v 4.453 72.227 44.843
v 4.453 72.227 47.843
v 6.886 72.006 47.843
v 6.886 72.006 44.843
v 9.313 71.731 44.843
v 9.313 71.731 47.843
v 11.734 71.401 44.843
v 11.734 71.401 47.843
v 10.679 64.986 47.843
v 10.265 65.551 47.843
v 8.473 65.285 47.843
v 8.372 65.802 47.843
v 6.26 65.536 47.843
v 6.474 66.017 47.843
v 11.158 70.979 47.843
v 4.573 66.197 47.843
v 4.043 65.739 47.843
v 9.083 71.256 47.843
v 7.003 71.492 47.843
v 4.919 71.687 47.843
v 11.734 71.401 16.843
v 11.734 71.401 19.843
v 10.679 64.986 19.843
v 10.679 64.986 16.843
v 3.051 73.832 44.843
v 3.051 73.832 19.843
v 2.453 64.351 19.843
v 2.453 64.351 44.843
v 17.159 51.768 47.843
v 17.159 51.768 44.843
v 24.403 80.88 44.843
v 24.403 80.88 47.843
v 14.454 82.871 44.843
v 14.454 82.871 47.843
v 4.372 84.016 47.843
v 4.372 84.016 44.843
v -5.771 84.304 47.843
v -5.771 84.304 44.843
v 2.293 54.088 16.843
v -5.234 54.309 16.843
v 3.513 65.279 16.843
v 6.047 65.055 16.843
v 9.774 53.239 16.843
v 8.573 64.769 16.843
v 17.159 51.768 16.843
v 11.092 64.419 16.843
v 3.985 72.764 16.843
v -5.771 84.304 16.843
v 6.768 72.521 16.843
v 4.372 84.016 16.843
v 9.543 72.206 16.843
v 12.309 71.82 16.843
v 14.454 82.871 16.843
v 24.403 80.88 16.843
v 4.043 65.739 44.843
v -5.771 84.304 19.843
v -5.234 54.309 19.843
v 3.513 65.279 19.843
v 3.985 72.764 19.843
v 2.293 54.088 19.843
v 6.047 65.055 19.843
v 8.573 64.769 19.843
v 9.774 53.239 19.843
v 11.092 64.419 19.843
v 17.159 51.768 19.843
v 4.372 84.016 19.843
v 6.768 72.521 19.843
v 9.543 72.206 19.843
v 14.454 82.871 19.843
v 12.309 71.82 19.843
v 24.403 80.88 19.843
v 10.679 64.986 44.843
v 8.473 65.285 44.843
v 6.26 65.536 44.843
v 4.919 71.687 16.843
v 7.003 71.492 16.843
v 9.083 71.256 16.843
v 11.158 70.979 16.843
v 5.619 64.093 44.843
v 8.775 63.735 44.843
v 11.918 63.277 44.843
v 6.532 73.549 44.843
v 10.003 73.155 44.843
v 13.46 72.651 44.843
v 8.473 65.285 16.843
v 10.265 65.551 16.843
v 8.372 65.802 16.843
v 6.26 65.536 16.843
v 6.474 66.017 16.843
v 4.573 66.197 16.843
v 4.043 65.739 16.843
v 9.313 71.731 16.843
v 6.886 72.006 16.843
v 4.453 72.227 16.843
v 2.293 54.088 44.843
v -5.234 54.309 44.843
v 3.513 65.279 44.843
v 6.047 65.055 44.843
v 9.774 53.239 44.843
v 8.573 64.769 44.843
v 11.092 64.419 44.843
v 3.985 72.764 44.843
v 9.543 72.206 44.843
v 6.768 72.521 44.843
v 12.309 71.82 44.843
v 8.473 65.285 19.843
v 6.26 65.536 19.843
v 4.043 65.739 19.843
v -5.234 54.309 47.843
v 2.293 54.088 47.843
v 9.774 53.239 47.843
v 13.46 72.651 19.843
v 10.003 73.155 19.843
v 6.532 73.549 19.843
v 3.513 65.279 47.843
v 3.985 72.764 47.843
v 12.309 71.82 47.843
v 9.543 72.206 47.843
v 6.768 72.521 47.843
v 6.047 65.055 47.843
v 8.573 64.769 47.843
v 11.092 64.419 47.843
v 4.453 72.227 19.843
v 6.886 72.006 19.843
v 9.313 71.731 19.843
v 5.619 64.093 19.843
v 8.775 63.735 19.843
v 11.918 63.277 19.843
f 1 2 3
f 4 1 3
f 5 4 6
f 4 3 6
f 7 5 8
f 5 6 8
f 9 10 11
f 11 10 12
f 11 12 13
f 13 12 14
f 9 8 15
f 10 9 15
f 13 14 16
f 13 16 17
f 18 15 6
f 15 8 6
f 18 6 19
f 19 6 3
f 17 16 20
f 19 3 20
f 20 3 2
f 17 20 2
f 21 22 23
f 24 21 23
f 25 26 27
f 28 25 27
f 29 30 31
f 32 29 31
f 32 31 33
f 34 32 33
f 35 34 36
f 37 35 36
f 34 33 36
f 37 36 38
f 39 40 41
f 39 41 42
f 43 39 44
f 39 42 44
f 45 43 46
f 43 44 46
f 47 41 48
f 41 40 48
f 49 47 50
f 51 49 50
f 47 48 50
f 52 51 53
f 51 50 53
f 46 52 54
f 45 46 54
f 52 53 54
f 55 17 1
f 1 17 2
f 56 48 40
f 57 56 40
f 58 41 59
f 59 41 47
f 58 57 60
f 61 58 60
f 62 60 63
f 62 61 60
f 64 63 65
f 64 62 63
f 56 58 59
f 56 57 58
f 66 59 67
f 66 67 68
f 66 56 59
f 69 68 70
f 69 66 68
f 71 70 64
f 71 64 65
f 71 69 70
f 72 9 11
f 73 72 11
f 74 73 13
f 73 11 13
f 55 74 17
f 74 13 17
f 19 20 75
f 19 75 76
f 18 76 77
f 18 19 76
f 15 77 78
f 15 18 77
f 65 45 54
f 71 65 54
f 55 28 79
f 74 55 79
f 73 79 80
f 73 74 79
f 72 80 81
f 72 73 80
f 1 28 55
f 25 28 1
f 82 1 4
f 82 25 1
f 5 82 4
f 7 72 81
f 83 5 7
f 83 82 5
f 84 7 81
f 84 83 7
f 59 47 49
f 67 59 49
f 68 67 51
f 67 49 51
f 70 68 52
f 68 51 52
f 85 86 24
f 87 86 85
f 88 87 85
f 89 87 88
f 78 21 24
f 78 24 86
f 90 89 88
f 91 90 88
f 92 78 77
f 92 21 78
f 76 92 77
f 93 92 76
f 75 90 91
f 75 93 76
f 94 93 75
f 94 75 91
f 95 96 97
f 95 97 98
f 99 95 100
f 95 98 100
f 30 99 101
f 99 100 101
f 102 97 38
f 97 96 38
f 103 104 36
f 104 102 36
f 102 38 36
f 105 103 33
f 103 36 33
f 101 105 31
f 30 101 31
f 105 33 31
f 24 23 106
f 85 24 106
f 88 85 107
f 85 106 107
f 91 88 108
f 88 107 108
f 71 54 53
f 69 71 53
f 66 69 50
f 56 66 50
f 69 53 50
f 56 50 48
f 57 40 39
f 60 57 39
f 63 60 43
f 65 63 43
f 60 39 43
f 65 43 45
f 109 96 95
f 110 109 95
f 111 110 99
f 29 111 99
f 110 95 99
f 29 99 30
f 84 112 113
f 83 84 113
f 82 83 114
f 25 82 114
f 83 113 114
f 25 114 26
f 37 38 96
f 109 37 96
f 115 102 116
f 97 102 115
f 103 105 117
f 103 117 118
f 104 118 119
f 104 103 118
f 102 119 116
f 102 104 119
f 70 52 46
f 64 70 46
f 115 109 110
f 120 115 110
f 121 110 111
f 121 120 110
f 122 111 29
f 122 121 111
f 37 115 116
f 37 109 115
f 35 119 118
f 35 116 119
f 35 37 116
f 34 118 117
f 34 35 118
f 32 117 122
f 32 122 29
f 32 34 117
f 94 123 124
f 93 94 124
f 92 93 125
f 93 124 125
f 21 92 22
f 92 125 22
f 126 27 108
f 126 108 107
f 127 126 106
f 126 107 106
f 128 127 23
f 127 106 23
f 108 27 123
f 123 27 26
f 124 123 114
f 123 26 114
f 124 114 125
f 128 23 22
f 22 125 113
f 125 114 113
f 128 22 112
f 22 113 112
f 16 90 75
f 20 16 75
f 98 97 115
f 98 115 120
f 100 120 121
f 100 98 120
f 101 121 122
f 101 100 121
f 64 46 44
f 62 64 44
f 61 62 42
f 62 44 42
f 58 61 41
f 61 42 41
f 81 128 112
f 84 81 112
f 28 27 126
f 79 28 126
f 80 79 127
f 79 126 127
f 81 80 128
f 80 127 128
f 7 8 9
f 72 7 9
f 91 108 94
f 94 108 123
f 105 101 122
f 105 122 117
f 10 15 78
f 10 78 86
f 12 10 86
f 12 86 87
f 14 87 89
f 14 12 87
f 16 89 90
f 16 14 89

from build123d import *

# Parameters (mm, degrees)
BOSS_EXTRUDE1_START      = 0.1
BOSS_EXTRUDE1_DEPTH      = 3
EXTRUDE_THIN1_DEPTH      = 25
BOSS_EXTRUDE2_DEPTH      = 3
BOSS_EXTRUDE3_DEPTH      = 25
BOSS_EXTRUDE4_DEPTH      = 3
BOSS_EXTRUDE4_DEPTH_BACK = 28


with BuildPart() as part:
    # Sketch1 → Boss-Extrude1 (new body)
    with BuildSketch(Plane.XY.offset(16.7429656).offset(BOSS_EXTRUDE1_START)):
        with BuildLine():
            Line((-5.770857241, 84.303922359), (-5.233937167, 54.308727464))
            ThreePointArc((-5.233937167, 54.308727464), (6.042241893, 53.741784506), (17.158709141, 51.767501232))
            Line((17.158709141, 51.767501232), (24.403411874, 80.879599787))
            ThreePointArc((24.403411874, 80.879599787), (9.425037263, 83.550126361), (-5.770857241, 84.303922359))
        make_face()
        with BuildLine():
            Line((12.309401555, 71.819693694), (11.092056694, 64.418608994))
            ThreePointArc((11.092056694, 64.418608994), (7.310803865, 64.920033498), (3.513347634, 65.278677697))
            Line((3.513347634, 65.278677697), (3.985423015, 72.764339196))
            ThreePointArc((3.985423015, 72.764339196), (8.156511847, 72.372199493), (12.309401555, 71.819693694))
        make_face(mode=Mode.SUBTRACT)
    extrude(amount=BOSS_EXTRUDE1_DEPTH)


with BuildPart() as body_2:
    # Sketch2 → Extrude-Thin1 (new body)
    with BuildSketch(Plane.XY.offset(19.8429656)):
        with BuildLine():
            Line((3.050778794, 73.832181223), (2.452857374, 64.350989175))
            ThreePointArc((2.452857374, 64.350989175), (7.198042801, 63.926411366), (11.917698616, 63.276873034))
            Line((11.917698616, 63.276873034), (13.459563743, 72.650941767))
            ThreePointArc((13.459563743, 72.650941767), (8.269272911, 73.365821625), (3.050778794, 73.832181223))
        make_face()
        with BuildLine():
            Line((3.985423015, 72.764339196), (3.513347634, 65.278677697))
            ThreePointArc((3.513347634, 65.278677697), (7.310803865, 64.920033498), (11.092056694, 64.418608994))
            Line((11.092056694, 64.418608994), (12.309401555, 71.819693694))
            ThreePointArc((12.309401555, 71.819693694), (8.156511847, 72.372199493), (3.985423015, 72.764339196))
        make_face(mode=Mode.SUBTRACT)
    extrude(amount=EXTRUDE_THIN1_DEPTH)

    # Sketch4 → Boss-Extrude3 (add)
    with BuildSketch(Plane(origin=(0, 0, 19.8429656), x_dir=(-1, 0, 0), z_dir=(0, 0, -1))):
        with BuildLine():
            Line((-3.985423015, 72.764339196), (-3.513347634, 65.278677697))
            ThreePointArc((-3.513347634, 65.278677697), (-7.310803865, 64.920033498), (-11.092056694, 64.418608994))
            Line((-11.092056694, 64.418608994), (-12.309401555, 71.819693694))
            ThreePointArc((-12.309401555, 71.819693694), (-8.156511847, 72.372199493), (-3.985423015, 72.764339196))
        make_face()
        with BuildLine():
            Line((-4.573231318, 66.196747792), (-4.919474926, 71.687104939))
            ThreePointArc((-4.919474926, 71.687104939), (-8.043750783, 71.37857736), (-11.15771197, 70.979159509))
            Line((-11.15771197, 70.979159509), (-10.26485059, 65.550835201))
            ThreePointArc((-10.26485059, 65.550835201), (-7.42356493, 65.913655631), (-4.573231318, 66.196747792))
        make_face(mode=Mode.SUBTRACT)
    extrude(amount=-BOSS_EXTRUDE3_DEPTH)

    # Sketch5 → Boss-Extrude4 (add, two sides: drawn at the far end of the back side and taken through both)
    with BuildSketch(Plane(origin=(0, 0, 19.8429656), x_dir=(-1, 0, 0), z_dir=(0, 0, -1)).offset(-BOSS_EXTRUDE4_DEPTH_BACK)):
        with BuildLine():
            Line((-4.043364195, 65.738897559), (-4.452524049, 72.226912575))
            ThreePointArc((-4.452524049, 72.226912575), (-8.100131315, 71.875388426), (-11.733750367, 71.400603658))
            Line((-11.733750367, 71.400603658), (-10.678646321, 64.985893525))
            ThreePointArc((-10.678646321, 64.985893525), (-7.367184398, 65.416844564), (-4.043364195, 65.738897559))
        make_face()
        with BuildLine():
            Line((-4.573231318, 66.196747792), (-4.919474926, 71.687104939))
            ThreePointArc((-4.919474926, 71.687104939), (-8.043750783, 71.37857736), (-11.15771197, 70.979159509))
            Line((-11.15771197, 70.979159509), (-10.26485059, 65.550835201))
            ThreePointArc((-10.26485059, 65.550835201), (-7.42356493, 65.913655631), (-4.573231318, 66.196747792))
        make_face(mode=Mode.SUBTRACT)
    extrude(amount=BOSS_EXTRUDE4_DEPTH + BOSS_EXTRUDE4_DEPTH_BACK)


with BuildPart() as body_3:
    # Sketch3 → Boss-Extrude2 (new body)
    with BuildSketch(Plane.XY.offset(44.8429656)):
        with BuildLine():
            Line((-5.770857241, 84.303922359), (-5.233937167, 54.308727464))
            ThreePointArc((-5.233937167, 54.308727464), (6.042241893, 53.741784506), (17.158709141, 51.767501232))
            Line((17.158709141, 51.767501232), (24.403411874, 80.879599787))
            ThreePointArc((24.403411874, 80.879599787), (9.425037263, 83.550126361), (-5.770857241, 84.303922359))
        make_face()
        with BuildLine():
            Line((11.092056694, 64.418608994), (12.309401555, 71.819693694))
            ThreePointArc((12.309401555, 71.819693694), (8.156511847, 72.372199493), (3.985423015, 72.764339196))
            Line((3.985423015, 72.764339196), (3.513347634, 65.278677697))
            ThreePointArc((3.513347634, 65.278677697), (7.310803865, 64.920033498), (11.092056694, 64.418608994))
        make_face(mode=Mode.SUBTRACT)
    extrude(amount=BOSS_EXTRUDE2_DEPTH)


solid = Compound([part.part, body_2.part, body_3.part])
